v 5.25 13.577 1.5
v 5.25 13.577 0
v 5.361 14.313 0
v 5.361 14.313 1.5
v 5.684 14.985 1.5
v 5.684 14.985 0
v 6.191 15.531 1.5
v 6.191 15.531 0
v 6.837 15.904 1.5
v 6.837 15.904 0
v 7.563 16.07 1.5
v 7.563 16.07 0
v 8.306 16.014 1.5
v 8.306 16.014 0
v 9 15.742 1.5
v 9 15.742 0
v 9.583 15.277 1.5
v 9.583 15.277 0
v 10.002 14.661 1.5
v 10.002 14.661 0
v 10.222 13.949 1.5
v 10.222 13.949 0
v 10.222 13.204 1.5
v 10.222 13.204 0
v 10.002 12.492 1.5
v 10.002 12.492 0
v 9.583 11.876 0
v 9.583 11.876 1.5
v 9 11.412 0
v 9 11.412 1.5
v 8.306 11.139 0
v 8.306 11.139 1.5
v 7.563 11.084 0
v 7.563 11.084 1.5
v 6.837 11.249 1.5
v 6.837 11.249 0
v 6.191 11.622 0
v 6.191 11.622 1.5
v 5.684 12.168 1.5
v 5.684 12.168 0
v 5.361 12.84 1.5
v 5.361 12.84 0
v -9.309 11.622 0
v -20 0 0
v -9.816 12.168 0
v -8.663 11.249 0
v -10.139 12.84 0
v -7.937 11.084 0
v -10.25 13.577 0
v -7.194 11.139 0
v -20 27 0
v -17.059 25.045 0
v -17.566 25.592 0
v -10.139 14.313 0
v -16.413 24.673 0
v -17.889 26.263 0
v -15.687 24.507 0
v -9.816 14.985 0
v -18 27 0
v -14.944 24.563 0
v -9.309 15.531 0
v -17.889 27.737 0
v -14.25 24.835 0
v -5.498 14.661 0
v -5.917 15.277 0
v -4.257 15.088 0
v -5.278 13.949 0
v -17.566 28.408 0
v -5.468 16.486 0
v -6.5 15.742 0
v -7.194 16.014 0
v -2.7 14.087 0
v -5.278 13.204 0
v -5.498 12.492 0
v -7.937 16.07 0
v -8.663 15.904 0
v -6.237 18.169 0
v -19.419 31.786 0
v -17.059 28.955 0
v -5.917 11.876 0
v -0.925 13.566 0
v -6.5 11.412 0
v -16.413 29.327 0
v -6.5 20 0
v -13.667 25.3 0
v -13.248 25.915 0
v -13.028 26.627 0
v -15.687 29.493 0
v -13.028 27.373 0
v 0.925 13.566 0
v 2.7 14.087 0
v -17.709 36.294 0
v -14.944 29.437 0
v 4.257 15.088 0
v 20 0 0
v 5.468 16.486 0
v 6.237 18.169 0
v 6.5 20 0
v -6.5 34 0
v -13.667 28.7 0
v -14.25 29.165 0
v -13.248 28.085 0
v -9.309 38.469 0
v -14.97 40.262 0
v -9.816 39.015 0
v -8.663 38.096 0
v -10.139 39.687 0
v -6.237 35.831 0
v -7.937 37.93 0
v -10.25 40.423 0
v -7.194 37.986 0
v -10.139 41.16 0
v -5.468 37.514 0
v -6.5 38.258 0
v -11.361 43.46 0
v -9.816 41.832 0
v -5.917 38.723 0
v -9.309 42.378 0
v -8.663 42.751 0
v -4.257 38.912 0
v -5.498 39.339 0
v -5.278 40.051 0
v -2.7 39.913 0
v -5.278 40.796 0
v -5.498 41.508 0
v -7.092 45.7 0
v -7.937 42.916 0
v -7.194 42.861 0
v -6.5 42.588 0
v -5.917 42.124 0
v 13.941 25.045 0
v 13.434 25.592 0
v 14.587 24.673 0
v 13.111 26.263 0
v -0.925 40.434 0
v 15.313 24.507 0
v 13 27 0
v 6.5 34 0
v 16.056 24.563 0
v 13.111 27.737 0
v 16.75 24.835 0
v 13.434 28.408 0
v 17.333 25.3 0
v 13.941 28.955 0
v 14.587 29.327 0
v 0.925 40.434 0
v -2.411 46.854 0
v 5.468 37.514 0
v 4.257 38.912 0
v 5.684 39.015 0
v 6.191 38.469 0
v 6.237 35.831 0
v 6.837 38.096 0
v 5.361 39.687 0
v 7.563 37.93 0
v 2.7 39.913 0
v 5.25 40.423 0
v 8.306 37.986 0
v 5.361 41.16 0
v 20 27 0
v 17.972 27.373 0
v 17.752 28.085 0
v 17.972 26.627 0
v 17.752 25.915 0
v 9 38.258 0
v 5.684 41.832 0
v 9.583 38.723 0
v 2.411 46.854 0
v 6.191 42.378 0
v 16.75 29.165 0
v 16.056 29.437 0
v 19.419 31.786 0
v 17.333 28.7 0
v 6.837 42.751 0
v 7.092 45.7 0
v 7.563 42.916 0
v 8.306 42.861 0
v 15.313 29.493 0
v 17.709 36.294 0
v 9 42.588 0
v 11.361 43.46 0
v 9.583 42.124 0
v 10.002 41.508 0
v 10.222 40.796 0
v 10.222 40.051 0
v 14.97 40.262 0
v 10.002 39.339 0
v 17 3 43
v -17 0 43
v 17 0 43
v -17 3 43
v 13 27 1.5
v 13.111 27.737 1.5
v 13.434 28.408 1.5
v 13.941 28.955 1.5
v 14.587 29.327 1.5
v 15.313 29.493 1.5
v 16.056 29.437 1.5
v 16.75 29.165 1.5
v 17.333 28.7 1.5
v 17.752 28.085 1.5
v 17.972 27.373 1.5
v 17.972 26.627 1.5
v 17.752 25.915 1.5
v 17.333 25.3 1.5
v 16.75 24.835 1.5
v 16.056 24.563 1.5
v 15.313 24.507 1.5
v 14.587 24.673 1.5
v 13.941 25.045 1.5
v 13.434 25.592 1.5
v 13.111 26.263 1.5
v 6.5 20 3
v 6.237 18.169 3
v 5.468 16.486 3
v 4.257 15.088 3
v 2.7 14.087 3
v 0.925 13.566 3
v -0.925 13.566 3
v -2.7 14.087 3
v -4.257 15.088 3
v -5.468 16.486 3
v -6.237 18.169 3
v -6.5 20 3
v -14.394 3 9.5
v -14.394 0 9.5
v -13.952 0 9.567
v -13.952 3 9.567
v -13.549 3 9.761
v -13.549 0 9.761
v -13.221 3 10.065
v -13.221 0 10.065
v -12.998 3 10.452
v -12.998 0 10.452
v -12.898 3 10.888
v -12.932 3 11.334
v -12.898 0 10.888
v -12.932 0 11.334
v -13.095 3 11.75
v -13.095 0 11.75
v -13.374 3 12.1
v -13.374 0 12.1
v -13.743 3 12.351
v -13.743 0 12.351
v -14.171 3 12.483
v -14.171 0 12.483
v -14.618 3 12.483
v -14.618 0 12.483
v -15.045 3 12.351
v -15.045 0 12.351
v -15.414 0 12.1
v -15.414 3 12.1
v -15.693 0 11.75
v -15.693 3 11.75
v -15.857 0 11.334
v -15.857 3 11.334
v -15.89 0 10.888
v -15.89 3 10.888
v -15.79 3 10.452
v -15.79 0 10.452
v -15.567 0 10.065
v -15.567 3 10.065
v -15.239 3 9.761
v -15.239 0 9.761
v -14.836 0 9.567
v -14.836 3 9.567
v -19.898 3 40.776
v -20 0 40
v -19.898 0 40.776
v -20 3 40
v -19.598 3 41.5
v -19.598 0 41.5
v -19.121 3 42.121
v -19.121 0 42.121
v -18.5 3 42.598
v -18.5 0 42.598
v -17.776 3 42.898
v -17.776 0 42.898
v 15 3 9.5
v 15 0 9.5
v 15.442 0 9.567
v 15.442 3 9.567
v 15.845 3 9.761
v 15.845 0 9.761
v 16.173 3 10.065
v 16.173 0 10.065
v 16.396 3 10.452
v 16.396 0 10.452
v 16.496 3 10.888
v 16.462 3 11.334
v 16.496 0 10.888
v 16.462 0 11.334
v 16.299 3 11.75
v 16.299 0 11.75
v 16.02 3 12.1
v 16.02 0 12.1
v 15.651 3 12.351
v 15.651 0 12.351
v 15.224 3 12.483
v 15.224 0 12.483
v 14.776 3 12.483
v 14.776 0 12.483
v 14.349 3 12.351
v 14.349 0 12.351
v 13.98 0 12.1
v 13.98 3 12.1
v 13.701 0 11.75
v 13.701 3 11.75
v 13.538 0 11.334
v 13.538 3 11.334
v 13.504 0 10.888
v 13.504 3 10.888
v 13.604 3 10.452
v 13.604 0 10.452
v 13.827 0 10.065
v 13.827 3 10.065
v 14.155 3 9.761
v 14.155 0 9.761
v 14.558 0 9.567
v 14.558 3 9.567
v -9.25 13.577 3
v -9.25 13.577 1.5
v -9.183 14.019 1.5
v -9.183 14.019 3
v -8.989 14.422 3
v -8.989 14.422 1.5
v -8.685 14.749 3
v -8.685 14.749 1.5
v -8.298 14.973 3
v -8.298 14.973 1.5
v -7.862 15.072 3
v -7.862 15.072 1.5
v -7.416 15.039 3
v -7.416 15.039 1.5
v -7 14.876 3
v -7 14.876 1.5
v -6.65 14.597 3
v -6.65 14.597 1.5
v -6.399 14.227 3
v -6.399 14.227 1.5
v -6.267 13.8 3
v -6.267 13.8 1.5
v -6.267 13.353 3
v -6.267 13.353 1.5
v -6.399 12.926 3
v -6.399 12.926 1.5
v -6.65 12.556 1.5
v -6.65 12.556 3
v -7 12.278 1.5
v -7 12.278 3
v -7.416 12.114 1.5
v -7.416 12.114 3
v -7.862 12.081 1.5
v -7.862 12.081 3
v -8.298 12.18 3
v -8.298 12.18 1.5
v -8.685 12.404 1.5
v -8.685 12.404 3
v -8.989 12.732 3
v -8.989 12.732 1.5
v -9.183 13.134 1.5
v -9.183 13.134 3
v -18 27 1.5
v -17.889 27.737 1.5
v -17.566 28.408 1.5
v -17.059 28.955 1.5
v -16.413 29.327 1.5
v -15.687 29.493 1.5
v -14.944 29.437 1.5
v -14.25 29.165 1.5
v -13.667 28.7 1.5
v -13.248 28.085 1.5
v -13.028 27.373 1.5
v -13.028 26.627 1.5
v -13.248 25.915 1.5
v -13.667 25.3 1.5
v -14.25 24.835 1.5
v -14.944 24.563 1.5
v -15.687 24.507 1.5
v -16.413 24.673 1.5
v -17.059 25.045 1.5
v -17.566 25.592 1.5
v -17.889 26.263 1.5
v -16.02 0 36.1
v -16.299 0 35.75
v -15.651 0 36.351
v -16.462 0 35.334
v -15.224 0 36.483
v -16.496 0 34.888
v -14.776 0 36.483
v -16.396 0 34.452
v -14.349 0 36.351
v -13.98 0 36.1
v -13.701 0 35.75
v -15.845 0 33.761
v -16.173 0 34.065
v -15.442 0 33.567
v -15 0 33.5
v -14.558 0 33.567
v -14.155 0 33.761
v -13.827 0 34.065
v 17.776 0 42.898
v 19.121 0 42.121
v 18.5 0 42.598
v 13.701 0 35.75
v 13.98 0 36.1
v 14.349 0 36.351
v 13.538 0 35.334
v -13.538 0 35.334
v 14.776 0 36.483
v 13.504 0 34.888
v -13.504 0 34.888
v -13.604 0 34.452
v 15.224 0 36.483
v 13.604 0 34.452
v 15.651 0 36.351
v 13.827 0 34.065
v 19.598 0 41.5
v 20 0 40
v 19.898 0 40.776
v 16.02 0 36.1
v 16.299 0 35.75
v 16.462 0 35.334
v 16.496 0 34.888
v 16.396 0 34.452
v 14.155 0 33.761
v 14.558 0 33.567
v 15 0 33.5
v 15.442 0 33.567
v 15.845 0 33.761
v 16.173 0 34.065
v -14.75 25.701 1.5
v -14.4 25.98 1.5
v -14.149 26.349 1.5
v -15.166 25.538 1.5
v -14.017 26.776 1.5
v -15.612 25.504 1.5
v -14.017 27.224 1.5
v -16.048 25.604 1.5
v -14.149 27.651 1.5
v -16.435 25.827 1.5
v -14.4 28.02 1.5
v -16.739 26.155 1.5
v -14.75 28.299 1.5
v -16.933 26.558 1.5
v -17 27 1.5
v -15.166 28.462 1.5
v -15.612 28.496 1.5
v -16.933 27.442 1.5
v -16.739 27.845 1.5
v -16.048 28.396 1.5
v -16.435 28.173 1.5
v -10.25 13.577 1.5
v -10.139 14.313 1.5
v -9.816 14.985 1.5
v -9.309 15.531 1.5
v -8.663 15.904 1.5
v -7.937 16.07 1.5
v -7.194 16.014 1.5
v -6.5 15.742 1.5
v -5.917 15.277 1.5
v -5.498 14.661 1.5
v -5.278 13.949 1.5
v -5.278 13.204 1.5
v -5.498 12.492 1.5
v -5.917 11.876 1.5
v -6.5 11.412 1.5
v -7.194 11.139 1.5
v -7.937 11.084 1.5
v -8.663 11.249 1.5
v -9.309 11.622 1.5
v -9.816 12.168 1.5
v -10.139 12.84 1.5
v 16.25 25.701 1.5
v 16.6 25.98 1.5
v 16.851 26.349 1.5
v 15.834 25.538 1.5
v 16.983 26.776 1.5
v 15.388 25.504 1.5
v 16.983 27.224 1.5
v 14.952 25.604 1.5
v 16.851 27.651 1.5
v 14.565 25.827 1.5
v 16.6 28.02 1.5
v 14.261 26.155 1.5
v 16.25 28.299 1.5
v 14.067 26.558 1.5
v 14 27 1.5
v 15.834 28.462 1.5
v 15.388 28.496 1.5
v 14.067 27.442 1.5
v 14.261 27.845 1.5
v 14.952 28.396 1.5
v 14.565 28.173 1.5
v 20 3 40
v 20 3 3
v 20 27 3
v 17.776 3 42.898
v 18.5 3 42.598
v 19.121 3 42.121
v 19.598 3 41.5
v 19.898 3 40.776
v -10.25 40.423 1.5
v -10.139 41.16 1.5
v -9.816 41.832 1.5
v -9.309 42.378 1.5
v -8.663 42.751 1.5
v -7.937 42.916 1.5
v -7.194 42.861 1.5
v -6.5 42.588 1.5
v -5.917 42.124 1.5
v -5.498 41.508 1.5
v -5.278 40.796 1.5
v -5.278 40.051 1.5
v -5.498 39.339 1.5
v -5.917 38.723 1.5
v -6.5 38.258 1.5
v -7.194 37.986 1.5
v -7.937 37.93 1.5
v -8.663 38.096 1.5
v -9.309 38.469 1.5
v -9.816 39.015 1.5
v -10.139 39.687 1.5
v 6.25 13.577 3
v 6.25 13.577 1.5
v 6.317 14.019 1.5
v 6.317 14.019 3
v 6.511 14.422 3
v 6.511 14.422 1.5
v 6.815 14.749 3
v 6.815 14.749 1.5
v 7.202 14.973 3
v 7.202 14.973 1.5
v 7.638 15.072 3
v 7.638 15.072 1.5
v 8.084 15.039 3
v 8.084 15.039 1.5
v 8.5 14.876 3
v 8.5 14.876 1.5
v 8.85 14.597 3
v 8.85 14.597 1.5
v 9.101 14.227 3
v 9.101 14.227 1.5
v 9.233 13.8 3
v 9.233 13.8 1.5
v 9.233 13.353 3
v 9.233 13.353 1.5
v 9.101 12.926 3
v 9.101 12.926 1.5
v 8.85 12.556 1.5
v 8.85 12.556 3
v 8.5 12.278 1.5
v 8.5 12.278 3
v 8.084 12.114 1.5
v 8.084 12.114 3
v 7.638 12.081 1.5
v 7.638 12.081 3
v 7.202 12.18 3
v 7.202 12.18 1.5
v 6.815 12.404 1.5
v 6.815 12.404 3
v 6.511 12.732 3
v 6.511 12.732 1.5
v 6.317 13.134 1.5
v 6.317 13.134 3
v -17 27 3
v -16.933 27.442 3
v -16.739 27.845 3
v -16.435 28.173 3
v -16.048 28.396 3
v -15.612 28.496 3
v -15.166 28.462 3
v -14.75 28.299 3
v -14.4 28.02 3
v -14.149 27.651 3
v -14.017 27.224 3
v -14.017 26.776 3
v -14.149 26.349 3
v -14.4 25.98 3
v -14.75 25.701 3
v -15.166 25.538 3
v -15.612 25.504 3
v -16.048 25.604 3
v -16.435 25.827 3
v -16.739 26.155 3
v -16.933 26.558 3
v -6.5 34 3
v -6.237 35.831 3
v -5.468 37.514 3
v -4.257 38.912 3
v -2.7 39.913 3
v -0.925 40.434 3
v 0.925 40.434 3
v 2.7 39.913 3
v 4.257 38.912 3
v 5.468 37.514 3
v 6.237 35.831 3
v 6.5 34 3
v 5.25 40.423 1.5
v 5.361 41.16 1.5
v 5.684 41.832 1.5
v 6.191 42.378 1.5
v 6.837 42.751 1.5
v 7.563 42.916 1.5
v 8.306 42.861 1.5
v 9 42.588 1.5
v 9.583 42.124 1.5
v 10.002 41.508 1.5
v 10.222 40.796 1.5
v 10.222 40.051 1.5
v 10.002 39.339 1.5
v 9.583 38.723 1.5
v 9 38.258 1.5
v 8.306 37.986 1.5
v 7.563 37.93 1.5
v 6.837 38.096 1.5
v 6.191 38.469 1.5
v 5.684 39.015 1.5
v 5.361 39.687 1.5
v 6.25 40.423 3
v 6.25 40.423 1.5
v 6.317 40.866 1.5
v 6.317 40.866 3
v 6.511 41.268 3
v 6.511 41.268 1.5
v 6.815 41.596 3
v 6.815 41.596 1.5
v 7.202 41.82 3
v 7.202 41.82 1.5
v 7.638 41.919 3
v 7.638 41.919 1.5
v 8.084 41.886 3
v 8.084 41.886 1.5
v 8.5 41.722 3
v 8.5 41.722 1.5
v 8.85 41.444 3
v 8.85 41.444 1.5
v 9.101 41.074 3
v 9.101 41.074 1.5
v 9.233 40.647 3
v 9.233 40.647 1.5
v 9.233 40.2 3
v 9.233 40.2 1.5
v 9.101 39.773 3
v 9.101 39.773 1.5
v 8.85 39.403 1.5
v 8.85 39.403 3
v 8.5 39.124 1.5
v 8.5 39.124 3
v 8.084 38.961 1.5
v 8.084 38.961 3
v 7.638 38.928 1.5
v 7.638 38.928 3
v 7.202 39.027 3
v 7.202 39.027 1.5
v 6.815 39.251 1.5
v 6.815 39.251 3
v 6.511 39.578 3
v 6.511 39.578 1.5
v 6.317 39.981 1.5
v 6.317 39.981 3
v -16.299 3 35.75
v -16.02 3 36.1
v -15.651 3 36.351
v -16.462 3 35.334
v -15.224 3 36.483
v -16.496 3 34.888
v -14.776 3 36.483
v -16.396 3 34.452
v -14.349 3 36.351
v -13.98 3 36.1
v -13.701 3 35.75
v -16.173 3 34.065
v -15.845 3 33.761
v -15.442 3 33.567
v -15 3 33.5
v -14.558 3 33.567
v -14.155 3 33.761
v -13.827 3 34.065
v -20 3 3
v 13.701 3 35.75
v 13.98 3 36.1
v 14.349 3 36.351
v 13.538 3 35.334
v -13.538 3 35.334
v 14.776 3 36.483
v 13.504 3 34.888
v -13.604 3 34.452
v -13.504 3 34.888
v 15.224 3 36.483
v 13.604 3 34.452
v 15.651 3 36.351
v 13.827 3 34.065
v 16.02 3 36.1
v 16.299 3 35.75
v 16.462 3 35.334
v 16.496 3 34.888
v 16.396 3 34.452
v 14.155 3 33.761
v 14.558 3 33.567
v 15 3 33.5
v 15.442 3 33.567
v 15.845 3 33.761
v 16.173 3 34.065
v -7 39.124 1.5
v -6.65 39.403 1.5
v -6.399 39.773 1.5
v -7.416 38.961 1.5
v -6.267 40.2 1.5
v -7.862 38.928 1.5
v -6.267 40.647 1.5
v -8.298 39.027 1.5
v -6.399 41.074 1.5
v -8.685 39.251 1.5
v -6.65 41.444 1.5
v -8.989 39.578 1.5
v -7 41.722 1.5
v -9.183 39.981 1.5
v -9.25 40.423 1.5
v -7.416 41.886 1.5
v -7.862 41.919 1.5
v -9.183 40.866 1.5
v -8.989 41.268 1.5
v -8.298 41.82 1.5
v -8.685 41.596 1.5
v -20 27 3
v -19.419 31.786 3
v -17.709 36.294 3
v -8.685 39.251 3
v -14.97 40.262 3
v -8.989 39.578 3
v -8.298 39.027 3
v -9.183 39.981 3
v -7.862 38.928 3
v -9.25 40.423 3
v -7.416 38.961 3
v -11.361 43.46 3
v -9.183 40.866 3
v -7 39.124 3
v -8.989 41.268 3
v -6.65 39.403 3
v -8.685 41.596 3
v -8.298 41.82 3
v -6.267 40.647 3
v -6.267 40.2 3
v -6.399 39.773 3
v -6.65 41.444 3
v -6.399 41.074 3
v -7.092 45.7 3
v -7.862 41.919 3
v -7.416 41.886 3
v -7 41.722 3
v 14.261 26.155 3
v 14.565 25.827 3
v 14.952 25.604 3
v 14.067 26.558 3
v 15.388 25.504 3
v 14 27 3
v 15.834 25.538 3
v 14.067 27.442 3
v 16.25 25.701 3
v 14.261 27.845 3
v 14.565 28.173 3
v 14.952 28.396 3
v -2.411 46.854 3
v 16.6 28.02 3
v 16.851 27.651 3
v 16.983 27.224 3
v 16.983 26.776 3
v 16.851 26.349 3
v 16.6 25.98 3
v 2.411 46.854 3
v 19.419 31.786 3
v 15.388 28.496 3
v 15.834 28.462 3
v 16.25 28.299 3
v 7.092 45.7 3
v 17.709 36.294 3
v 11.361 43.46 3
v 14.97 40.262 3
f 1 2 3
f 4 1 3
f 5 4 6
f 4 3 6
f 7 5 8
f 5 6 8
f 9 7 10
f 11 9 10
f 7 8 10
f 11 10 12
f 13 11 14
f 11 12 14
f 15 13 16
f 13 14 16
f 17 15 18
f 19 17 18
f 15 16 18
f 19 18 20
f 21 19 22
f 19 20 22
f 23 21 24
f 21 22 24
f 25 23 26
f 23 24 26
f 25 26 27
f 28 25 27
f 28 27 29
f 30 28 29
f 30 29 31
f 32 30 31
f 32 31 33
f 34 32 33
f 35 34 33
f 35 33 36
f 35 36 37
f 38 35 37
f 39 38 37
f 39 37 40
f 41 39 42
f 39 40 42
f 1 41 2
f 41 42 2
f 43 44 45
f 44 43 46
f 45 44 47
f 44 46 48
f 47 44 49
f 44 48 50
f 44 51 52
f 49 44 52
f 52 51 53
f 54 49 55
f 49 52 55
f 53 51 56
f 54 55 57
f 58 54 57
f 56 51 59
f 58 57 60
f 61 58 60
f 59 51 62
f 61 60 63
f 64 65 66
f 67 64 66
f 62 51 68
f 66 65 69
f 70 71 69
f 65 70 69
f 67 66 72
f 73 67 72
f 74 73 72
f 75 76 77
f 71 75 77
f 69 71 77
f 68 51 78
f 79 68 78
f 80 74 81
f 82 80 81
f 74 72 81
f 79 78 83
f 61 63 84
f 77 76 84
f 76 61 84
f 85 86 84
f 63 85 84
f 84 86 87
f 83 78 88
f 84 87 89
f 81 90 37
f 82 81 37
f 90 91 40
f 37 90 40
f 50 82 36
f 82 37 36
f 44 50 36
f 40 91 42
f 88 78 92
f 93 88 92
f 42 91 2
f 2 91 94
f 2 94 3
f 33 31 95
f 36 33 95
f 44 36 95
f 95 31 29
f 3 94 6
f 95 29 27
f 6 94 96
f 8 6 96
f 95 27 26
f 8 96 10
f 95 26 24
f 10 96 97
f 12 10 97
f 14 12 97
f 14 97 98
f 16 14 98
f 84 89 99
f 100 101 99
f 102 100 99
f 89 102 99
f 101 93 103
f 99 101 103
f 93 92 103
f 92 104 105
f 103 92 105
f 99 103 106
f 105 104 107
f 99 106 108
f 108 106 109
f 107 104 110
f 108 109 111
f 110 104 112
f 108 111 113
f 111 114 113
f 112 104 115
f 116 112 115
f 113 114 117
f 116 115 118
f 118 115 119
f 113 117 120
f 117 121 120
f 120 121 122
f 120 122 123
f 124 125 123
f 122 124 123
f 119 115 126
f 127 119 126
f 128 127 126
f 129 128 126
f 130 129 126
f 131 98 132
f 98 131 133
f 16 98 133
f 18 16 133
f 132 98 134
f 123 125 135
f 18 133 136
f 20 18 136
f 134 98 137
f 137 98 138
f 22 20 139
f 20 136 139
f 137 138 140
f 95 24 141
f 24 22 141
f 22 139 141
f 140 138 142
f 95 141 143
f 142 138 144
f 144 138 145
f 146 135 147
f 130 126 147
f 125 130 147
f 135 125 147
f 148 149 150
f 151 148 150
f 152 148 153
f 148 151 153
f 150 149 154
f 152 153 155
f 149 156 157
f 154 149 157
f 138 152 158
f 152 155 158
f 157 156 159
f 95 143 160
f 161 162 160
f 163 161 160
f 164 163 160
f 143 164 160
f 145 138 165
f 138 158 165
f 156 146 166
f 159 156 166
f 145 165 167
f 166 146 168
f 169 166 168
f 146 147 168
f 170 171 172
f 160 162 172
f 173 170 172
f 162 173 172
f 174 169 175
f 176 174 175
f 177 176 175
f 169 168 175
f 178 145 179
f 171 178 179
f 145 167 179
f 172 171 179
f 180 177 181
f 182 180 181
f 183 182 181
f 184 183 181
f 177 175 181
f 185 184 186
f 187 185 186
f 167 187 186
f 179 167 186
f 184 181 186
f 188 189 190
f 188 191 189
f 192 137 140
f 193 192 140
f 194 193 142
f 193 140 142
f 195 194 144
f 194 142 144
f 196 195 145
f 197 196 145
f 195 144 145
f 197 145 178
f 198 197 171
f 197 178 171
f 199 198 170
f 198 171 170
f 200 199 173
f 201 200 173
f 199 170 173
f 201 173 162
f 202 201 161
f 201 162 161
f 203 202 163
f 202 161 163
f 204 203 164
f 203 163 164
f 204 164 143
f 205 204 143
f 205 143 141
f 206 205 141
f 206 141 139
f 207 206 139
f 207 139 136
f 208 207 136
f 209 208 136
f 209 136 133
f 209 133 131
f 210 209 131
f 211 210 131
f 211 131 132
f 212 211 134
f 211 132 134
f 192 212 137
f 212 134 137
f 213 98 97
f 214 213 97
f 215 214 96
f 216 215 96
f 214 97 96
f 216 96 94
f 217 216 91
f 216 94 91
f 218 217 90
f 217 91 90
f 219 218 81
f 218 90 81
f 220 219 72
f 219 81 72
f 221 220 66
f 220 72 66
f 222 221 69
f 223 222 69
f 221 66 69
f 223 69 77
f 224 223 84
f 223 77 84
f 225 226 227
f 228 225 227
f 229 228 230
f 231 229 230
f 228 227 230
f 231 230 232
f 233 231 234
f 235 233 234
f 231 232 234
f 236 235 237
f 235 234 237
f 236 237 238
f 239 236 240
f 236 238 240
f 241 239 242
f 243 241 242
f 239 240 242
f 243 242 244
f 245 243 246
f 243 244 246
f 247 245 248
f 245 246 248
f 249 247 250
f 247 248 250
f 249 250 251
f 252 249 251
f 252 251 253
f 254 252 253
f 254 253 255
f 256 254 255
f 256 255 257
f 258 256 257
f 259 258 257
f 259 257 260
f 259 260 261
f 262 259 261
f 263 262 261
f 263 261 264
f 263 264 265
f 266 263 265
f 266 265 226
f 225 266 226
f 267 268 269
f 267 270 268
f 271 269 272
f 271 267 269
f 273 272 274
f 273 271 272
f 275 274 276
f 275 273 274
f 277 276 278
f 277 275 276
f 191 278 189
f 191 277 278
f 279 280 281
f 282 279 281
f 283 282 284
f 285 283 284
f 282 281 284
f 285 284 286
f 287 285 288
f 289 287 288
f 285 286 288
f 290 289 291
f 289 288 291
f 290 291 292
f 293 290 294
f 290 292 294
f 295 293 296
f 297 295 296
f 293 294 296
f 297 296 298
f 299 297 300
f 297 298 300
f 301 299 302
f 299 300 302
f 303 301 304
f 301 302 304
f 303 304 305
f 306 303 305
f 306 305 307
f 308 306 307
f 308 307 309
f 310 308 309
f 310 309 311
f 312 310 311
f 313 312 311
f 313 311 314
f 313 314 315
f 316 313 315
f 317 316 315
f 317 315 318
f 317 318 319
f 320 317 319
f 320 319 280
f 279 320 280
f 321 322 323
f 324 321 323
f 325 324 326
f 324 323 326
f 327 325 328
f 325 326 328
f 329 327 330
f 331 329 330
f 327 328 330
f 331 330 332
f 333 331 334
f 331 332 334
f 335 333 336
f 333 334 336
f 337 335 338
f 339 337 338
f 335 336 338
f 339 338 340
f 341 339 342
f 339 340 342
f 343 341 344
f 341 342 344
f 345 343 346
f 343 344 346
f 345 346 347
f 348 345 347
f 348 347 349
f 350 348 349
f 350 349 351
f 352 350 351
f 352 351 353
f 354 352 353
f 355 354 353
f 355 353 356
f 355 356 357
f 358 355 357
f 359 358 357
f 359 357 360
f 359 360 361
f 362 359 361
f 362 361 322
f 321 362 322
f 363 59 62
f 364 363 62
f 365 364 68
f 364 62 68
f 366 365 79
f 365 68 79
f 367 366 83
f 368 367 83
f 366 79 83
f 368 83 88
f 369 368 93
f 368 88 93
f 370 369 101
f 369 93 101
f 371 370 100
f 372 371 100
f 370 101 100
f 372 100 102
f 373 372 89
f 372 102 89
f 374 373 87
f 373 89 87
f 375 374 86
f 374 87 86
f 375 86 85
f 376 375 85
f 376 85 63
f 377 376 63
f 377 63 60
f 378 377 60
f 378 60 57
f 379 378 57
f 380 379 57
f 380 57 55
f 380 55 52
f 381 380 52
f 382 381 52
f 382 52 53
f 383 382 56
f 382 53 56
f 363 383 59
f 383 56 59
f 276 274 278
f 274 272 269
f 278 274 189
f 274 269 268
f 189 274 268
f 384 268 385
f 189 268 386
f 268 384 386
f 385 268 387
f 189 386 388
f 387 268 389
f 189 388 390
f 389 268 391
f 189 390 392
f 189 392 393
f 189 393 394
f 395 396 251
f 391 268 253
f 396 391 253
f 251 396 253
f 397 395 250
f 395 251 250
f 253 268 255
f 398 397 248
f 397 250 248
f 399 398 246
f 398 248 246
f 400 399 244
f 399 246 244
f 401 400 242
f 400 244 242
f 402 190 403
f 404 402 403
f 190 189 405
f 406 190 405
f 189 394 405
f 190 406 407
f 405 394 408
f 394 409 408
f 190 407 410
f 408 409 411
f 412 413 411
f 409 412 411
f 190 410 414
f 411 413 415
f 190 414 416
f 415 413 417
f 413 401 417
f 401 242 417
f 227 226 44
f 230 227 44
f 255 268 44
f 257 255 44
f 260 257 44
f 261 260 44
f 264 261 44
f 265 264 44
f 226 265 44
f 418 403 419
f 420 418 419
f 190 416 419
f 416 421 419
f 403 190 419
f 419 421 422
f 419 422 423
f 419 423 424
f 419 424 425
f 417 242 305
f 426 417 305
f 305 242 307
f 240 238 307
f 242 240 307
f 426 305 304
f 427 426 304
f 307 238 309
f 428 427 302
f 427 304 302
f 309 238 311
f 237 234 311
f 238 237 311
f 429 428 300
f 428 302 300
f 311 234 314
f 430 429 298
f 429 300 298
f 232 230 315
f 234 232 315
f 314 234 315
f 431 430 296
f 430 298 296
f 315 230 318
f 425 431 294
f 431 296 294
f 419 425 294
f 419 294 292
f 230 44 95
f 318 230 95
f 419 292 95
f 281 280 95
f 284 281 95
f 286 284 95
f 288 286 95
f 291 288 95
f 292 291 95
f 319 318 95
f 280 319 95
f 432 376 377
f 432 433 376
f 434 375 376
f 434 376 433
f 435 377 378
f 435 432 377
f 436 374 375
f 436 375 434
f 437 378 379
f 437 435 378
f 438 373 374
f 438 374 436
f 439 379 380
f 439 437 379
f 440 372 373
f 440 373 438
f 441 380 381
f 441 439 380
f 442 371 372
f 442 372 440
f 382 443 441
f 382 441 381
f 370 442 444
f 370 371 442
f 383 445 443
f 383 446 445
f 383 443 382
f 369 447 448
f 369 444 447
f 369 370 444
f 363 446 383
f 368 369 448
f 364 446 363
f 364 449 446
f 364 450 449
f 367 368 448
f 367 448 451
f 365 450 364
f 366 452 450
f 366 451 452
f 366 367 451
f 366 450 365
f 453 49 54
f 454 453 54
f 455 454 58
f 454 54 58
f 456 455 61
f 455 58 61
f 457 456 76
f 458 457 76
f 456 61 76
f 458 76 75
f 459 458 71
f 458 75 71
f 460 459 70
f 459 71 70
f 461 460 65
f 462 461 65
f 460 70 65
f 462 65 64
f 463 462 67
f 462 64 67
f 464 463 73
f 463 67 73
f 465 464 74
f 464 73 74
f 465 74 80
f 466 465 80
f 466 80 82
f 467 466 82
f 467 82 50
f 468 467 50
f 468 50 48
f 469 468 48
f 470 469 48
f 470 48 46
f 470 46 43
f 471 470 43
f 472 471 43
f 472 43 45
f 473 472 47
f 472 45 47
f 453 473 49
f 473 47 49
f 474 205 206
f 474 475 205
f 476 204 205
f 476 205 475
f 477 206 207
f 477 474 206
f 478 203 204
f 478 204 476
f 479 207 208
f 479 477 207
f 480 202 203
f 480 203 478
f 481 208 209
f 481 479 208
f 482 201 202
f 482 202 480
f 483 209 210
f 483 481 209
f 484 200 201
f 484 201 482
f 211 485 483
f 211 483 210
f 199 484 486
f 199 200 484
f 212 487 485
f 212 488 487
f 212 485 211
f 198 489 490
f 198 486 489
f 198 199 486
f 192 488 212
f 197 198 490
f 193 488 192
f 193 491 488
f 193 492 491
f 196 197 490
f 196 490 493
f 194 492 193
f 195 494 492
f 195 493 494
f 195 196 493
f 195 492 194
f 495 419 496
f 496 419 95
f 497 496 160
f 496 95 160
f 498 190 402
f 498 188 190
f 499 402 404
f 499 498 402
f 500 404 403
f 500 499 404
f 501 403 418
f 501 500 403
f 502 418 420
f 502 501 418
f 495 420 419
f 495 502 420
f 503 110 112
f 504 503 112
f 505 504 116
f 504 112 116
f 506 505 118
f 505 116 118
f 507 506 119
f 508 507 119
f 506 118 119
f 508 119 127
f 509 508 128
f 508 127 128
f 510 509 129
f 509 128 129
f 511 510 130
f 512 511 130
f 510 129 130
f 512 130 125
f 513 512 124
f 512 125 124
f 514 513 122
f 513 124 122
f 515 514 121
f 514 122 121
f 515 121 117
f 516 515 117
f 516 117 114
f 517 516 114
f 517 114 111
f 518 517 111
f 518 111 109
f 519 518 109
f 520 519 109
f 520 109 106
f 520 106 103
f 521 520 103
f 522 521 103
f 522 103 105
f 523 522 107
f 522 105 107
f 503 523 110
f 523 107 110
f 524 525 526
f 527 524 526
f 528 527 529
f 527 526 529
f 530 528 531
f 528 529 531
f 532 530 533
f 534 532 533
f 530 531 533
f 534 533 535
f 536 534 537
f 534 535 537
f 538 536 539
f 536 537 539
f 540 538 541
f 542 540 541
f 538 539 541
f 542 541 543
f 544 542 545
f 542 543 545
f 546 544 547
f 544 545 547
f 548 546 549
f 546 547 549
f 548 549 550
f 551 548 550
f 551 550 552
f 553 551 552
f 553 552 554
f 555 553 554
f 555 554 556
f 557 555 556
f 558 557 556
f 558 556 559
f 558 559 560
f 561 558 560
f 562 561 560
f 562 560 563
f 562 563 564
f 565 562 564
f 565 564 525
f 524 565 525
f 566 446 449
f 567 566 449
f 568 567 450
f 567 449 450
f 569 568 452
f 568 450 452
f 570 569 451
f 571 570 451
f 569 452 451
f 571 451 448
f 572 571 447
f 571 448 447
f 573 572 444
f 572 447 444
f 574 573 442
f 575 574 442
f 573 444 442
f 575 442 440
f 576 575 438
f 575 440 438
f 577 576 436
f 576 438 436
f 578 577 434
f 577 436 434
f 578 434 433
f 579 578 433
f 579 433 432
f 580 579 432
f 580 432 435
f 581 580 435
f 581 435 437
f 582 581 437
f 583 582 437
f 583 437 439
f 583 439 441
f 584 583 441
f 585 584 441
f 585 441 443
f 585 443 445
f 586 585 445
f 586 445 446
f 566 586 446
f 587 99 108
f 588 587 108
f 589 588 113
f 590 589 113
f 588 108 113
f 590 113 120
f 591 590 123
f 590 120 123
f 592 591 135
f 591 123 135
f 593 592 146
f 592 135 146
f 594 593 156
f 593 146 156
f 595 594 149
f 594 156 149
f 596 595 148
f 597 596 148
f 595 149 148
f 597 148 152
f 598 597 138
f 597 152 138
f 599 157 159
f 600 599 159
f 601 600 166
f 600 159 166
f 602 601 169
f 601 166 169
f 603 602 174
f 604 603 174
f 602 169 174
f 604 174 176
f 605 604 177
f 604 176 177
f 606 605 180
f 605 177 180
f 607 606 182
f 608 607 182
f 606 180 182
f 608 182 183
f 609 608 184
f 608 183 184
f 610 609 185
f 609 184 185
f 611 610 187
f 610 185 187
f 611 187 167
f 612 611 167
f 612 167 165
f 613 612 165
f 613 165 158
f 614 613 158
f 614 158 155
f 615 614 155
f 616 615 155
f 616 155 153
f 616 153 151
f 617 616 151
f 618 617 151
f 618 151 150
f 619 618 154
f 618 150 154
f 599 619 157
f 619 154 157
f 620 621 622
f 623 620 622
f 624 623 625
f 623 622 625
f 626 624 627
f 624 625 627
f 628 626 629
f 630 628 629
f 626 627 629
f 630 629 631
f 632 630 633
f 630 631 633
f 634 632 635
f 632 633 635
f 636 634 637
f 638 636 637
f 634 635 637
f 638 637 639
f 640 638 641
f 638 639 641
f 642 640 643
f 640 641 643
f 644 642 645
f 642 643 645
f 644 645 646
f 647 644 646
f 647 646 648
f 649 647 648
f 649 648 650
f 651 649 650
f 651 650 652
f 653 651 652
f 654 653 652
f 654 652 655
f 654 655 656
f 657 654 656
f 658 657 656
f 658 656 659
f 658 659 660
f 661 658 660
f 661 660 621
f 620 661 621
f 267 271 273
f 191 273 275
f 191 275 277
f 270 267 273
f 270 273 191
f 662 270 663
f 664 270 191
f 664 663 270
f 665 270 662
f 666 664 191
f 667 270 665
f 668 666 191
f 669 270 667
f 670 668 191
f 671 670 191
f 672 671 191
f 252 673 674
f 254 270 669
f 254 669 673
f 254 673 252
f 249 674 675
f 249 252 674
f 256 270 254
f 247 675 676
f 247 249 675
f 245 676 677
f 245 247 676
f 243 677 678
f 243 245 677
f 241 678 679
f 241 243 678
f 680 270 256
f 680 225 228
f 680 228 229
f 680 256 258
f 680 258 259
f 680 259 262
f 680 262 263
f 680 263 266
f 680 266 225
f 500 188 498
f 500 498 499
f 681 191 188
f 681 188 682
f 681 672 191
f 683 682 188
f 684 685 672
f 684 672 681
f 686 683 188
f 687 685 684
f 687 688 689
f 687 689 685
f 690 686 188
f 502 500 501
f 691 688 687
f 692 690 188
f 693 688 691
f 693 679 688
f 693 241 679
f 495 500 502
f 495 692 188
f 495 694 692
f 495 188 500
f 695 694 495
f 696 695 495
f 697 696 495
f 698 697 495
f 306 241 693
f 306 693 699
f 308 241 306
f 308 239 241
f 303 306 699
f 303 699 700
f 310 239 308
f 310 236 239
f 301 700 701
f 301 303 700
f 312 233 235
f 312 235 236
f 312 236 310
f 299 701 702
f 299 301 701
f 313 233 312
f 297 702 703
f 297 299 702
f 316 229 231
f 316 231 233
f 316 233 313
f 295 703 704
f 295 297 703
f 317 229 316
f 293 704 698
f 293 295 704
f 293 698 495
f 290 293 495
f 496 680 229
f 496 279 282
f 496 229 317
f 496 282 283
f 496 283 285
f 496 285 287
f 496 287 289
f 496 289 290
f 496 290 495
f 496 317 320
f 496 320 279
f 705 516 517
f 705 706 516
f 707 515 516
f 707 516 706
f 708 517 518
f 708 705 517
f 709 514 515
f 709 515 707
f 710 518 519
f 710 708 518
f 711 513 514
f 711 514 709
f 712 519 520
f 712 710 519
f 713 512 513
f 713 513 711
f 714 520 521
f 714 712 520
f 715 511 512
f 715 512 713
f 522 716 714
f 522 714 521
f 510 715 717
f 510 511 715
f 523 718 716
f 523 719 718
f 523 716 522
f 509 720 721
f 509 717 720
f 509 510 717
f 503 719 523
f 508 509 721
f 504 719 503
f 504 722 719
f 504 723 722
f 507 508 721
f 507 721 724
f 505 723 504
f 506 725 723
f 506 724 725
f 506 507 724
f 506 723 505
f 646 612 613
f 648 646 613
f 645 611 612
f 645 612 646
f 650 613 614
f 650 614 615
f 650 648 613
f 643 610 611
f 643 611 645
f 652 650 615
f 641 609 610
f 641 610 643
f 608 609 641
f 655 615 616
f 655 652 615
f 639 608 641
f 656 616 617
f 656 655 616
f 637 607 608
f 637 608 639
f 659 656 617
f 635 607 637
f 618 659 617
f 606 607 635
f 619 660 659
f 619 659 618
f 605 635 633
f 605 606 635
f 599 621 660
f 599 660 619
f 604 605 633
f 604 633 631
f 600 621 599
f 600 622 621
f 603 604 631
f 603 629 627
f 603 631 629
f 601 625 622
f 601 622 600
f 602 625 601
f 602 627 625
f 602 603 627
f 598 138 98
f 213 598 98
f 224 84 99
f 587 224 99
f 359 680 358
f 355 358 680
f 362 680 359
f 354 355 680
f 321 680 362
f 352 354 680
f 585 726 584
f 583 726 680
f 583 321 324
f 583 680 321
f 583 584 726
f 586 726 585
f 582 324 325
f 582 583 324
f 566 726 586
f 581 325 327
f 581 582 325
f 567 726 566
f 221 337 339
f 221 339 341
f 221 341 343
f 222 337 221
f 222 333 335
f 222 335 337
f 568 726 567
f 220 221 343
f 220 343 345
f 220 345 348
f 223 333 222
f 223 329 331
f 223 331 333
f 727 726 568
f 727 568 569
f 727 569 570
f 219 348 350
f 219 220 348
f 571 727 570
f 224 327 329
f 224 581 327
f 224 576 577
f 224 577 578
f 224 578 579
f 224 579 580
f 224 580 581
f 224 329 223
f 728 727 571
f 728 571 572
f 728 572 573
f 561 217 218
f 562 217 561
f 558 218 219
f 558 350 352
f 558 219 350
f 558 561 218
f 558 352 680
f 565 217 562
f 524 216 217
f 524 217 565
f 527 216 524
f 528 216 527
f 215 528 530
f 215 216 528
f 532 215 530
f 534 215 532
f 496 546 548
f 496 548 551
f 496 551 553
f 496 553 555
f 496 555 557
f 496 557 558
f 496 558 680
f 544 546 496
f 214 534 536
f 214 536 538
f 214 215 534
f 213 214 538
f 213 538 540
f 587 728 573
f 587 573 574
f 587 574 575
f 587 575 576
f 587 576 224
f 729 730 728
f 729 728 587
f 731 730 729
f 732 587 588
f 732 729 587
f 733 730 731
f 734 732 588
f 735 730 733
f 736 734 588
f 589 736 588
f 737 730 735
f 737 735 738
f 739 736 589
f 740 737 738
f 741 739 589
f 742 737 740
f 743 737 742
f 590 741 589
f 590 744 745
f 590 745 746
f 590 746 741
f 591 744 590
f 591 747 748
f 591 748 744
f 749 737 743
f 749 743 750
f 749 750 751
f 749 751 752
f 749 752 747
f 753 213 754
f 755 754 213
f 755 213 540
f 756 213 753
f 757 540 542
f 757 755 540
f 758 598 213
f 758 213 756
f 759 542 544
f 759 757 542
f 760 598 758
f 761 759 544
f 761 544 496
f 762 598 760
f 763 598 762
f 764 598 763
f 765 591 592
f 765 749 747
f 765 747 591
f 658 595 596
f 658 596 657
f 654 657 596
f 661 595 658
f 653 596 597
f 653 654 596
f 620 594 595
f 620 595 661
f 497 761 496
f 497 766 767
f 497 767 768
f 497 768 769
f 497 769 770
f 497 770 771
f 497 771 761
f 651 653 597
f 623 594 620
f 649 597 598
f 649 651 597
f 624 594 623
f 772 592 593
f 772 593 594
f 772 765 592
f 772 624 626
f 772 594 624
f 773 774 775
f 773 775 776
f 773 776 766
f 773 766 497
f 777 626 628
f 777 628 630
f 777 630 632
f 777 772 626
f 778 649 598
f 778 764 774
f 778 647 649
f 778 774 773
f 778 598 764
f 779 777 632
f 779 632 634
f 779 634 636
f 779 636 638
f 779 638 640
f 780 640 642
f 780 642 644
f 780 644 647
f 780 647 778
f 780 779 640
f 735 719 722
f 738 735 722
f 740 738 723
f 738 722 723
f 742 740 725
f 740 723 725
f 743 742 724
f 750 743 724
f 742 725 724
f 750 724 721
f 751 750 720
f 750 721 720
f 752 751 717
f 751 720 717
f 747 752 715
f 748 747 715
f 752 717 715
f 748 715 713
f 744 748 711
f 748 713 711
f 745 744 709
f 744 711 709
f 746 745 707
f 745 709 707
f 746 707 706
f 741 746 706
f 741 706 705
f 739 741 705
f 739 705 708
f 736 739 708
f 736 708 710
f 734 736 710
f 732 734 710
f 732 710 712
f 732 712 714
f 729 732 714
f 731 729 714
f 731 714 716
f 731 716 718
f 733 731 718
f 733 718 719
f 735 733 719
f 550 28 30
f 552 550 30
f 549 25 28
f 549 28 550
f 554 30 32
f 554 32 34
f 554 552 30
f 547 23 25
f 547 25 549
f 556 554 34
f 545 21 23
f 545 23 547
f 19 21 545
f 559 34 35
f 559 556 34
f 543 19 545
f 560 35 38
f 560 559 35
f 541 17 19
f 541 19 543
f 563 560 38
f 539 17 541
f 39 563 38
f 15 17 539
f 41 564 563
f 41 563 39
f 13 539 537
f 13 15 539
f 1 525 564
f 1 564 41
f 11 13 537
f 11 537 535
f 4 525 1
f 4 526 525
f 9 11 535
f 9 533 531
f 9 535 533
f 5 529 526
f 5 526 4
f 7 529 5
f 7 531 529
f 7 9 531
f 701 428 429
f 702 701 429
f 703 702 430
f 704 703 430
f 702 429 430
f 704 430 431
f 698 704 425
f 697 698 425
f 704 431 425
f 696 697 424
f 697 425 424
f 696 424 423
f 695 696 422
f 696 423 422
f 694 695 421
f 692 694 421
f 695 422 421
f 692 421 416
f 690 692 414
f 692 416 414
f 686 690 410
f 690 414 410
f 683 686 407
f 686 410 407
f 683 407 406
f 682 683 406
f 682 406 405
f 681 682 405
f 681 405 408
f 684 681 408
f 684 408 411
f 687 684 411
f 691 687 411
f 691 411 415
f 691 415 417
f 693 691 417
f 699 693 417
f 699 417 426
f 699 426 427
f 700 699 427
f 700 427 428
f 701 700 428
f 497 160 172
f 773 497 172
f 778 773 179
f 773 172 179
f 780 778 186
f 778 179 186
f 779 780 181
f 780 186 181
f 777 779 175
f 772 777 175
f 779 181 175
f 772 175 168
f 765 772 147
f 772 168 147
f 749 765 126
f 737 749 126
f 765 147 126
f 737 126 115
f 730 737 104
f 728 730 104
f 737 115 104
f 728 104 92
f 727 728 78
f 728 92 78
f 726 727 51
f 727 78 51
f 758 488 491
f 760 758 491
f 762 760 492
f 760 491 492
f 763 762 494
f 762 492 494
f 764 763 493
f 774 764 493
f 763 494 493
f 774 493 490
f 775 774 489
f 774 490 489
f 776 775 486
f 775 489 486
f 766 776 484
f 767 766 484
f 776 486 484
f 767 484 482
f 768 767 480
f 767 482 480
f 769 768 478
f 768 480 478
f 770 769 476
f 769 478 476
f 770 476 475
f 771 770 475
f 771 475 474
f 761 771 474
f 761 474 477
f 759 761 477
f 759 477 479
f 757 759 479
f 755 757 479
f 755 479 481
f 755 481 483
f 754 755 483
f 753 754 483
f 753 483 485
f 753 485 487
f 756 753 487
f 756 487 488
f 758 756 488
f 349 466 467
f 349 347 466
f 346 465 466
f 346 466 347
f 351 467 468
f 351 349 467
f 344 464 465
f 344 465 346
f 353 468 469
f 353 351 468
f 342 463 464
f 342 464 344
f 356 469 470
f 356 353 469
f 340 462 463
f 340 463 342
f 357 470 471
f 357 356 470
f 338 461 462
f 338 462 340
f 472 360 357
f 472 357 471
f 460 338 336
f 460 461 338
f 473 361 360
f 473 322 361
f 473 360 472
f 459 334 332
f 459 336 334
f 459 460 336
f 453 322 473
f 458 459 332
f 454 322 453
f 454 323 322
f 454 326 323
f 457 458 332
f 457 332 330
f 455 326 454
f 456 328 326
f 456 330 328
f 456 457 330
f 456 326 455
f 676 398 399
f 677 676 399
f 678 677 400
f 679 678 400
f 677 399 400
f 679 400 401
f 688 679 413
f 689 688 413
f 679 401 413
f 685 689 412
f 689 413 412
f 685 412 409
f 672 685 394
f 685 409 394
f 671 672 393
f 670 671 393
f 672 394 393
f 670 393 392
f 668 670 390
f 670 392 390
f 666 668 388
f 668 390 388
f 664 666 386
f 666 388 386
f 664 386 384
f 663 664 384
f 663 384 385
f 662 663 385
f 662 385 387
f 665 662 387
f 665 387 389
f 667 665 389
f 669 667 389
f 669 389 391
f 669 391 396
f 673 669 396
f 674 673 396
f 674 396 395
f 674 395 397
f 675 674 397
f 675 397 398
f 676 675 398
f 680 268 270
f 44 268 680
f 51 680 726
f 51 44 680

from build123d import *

# Parameters (mm, degrees)
EXTRUDE_1_DEPTH     = 3
SKETCH_2_W          = 40
SKETCH_2_H          = 3
EXTRUDE_2_DEPTH     = 40
SKETCH_3_R          = 2.5
CUT_EXTRUDE_1_DEPTH = 1.5
SKETCH_4_R          = 1.5
CUT_EXTRUDE_2_DEPTH = 66.812232905
SKETCH_5_R          = 1.5
CUT_EXTRUDE_3_DEPTH = 67.76825593
FILLET_1_R          = 3
CUT_EXTRUDE_4_REACH = 68.768


with BuildPart() as part:
    # 草图1 → 凸台-拉伸1 (new body)
    with BuildSketch(Plane.XY):
        with BuildLine():
            Line((-20, 0), (20, 0))
            Line((20, 0), (20, 27))
            ThreePointArc((20, 27), (0, 47), (-20, 27))
            Line((-20, 27), (-20, 0))
        make_face()
    extrude(amount=EXTRUDE_1_DEPTH)

    # 草图2 → 凸台-拉伸2 (add)
    with BuildSketch(Plane.XY.offset(3)):
        with Locations((0, 1.5)):
            Rectangle(SKETCH_2_W, SKETCH_2_H)
    extrude(amount=EXTRUDE_2_DEPTH)

    # 草图3 → 切除-拉伸1 (cut)
    with BuildSketch(Plane(origin=(0, 0, 0), x_dir=(-1, 0, 0), z_dir=(0, 0, -1))):
        with Locations((-15.5, 27)):
            Circle(SKETCH_3_R)
        with Locations((-7.75, 40.423393759)):
            Circle(SKETCH_3_R)
        with Locations((7.75, 40.423393759)):
            Circle(SKETCH_3_R)
        with Locations((15.5, 27)):
            Circle(SKETCH_3_R)
        with Locations((7.75, 13.576606241)):
            Circle(SKETCH_3_R)
        with Locations((-7.75, 13.576606241)):
            Circle(SKETCH_3_R)
    extrude(amount=-CUT_EXTRUDE_1_DEPTH, mode=Mode.SUBTRACT)

    # 草图4 → 切除-拉伸2 (cut, through all)
    with BuildSketch(Plane(origin=(0, 0, 1.5), x_dir=(-1, 0, 0), z_dir=(0, 0, -1))):
        with Locations((-15.5, 27)):
            Circle(SKETCH_4_R)
        with Locations((-7.75, 40.423393759)):
            Circle(SKETCH_4_R)
        with Locations((7.75, 40.423393759)):
            Circle(SKETCH_4_R)
        with Locations((15.5, 27)):
            Circle(SKETCH_4_R)
        with Locations((7.75, 13.576606241)):
            Circle(SKETCH_4_R)
        with Locations((-7.75, 13.576606241)):
            Circle(SKETCH_4_R)
    extrude(amount=-CUT_EXTRUDE_2_DEPTH, mode=Mode.SUBTRACT)

    # 草图5 → 切除-拉伸3 (cut, through all)
    with BuildSketch(Plane.XZ):
        with Locations(Location((-15, 35, 0), (0, 0, 270))):
            Circle(SKETCH_5_R)
        with Locations(Location((15, 35, 0), (0, 0, 270))):
            Circle(SKETCH_5_R)
        with Locations(Location((-14.39414679, 11, 0), (0, 0, 270))):
            Circle(SKETCH_5_R)
        with Locations(Location((15, 11, 0), (0, 0, 270))):
            Circle(SKETCH_5_R)
    extrude(amount=-CUT_EXTRUDE_3_DEPTH, mode=Mode.SUBTRACT)

    # 圆角1
    fillet_1_edges = [part.edges().sort_by_distance(p)[0] for p in [
        (20, 1.5, 43),
        (-20, 1.5, 43),
    ]]
    fillet(fillet_1_edges, radius=FILLET_1_R)

    # 草图6 → 切除-拉伸4 (cut, up to next)
    with BuildSketch(Plane(origin=(0, 0, 0), x_dir=(-1, 0, 0), z_dir=(0, 0, -1)), mode=Mode.PRIVATE) as cut_extrude_4_sk1:
        with BuildLine():
            Line((-6.5, 34), (-6.5, 20))
            ThreePointArc((-6.5, 20), (0, 13.5), (6.5, 20))
            Line((6.5, 20), (6.5, 34))
            ThreePointArc((6.5, 34), (0, 40.5), (-6.5, 34))
        make_face()
    cut_extrude_4_tool1 = extrude(cut_extrude_4_sk1.sketch, amount=-CUT_EXTRUDE_4_REACH, mode=Mode.PRIVATE) & part.part
    add(cut_extrude_4_tool1.solids().sort_by_distance((0, 27, 0))[0], mode=Mode.SUBTRACT)


solid = part.part
